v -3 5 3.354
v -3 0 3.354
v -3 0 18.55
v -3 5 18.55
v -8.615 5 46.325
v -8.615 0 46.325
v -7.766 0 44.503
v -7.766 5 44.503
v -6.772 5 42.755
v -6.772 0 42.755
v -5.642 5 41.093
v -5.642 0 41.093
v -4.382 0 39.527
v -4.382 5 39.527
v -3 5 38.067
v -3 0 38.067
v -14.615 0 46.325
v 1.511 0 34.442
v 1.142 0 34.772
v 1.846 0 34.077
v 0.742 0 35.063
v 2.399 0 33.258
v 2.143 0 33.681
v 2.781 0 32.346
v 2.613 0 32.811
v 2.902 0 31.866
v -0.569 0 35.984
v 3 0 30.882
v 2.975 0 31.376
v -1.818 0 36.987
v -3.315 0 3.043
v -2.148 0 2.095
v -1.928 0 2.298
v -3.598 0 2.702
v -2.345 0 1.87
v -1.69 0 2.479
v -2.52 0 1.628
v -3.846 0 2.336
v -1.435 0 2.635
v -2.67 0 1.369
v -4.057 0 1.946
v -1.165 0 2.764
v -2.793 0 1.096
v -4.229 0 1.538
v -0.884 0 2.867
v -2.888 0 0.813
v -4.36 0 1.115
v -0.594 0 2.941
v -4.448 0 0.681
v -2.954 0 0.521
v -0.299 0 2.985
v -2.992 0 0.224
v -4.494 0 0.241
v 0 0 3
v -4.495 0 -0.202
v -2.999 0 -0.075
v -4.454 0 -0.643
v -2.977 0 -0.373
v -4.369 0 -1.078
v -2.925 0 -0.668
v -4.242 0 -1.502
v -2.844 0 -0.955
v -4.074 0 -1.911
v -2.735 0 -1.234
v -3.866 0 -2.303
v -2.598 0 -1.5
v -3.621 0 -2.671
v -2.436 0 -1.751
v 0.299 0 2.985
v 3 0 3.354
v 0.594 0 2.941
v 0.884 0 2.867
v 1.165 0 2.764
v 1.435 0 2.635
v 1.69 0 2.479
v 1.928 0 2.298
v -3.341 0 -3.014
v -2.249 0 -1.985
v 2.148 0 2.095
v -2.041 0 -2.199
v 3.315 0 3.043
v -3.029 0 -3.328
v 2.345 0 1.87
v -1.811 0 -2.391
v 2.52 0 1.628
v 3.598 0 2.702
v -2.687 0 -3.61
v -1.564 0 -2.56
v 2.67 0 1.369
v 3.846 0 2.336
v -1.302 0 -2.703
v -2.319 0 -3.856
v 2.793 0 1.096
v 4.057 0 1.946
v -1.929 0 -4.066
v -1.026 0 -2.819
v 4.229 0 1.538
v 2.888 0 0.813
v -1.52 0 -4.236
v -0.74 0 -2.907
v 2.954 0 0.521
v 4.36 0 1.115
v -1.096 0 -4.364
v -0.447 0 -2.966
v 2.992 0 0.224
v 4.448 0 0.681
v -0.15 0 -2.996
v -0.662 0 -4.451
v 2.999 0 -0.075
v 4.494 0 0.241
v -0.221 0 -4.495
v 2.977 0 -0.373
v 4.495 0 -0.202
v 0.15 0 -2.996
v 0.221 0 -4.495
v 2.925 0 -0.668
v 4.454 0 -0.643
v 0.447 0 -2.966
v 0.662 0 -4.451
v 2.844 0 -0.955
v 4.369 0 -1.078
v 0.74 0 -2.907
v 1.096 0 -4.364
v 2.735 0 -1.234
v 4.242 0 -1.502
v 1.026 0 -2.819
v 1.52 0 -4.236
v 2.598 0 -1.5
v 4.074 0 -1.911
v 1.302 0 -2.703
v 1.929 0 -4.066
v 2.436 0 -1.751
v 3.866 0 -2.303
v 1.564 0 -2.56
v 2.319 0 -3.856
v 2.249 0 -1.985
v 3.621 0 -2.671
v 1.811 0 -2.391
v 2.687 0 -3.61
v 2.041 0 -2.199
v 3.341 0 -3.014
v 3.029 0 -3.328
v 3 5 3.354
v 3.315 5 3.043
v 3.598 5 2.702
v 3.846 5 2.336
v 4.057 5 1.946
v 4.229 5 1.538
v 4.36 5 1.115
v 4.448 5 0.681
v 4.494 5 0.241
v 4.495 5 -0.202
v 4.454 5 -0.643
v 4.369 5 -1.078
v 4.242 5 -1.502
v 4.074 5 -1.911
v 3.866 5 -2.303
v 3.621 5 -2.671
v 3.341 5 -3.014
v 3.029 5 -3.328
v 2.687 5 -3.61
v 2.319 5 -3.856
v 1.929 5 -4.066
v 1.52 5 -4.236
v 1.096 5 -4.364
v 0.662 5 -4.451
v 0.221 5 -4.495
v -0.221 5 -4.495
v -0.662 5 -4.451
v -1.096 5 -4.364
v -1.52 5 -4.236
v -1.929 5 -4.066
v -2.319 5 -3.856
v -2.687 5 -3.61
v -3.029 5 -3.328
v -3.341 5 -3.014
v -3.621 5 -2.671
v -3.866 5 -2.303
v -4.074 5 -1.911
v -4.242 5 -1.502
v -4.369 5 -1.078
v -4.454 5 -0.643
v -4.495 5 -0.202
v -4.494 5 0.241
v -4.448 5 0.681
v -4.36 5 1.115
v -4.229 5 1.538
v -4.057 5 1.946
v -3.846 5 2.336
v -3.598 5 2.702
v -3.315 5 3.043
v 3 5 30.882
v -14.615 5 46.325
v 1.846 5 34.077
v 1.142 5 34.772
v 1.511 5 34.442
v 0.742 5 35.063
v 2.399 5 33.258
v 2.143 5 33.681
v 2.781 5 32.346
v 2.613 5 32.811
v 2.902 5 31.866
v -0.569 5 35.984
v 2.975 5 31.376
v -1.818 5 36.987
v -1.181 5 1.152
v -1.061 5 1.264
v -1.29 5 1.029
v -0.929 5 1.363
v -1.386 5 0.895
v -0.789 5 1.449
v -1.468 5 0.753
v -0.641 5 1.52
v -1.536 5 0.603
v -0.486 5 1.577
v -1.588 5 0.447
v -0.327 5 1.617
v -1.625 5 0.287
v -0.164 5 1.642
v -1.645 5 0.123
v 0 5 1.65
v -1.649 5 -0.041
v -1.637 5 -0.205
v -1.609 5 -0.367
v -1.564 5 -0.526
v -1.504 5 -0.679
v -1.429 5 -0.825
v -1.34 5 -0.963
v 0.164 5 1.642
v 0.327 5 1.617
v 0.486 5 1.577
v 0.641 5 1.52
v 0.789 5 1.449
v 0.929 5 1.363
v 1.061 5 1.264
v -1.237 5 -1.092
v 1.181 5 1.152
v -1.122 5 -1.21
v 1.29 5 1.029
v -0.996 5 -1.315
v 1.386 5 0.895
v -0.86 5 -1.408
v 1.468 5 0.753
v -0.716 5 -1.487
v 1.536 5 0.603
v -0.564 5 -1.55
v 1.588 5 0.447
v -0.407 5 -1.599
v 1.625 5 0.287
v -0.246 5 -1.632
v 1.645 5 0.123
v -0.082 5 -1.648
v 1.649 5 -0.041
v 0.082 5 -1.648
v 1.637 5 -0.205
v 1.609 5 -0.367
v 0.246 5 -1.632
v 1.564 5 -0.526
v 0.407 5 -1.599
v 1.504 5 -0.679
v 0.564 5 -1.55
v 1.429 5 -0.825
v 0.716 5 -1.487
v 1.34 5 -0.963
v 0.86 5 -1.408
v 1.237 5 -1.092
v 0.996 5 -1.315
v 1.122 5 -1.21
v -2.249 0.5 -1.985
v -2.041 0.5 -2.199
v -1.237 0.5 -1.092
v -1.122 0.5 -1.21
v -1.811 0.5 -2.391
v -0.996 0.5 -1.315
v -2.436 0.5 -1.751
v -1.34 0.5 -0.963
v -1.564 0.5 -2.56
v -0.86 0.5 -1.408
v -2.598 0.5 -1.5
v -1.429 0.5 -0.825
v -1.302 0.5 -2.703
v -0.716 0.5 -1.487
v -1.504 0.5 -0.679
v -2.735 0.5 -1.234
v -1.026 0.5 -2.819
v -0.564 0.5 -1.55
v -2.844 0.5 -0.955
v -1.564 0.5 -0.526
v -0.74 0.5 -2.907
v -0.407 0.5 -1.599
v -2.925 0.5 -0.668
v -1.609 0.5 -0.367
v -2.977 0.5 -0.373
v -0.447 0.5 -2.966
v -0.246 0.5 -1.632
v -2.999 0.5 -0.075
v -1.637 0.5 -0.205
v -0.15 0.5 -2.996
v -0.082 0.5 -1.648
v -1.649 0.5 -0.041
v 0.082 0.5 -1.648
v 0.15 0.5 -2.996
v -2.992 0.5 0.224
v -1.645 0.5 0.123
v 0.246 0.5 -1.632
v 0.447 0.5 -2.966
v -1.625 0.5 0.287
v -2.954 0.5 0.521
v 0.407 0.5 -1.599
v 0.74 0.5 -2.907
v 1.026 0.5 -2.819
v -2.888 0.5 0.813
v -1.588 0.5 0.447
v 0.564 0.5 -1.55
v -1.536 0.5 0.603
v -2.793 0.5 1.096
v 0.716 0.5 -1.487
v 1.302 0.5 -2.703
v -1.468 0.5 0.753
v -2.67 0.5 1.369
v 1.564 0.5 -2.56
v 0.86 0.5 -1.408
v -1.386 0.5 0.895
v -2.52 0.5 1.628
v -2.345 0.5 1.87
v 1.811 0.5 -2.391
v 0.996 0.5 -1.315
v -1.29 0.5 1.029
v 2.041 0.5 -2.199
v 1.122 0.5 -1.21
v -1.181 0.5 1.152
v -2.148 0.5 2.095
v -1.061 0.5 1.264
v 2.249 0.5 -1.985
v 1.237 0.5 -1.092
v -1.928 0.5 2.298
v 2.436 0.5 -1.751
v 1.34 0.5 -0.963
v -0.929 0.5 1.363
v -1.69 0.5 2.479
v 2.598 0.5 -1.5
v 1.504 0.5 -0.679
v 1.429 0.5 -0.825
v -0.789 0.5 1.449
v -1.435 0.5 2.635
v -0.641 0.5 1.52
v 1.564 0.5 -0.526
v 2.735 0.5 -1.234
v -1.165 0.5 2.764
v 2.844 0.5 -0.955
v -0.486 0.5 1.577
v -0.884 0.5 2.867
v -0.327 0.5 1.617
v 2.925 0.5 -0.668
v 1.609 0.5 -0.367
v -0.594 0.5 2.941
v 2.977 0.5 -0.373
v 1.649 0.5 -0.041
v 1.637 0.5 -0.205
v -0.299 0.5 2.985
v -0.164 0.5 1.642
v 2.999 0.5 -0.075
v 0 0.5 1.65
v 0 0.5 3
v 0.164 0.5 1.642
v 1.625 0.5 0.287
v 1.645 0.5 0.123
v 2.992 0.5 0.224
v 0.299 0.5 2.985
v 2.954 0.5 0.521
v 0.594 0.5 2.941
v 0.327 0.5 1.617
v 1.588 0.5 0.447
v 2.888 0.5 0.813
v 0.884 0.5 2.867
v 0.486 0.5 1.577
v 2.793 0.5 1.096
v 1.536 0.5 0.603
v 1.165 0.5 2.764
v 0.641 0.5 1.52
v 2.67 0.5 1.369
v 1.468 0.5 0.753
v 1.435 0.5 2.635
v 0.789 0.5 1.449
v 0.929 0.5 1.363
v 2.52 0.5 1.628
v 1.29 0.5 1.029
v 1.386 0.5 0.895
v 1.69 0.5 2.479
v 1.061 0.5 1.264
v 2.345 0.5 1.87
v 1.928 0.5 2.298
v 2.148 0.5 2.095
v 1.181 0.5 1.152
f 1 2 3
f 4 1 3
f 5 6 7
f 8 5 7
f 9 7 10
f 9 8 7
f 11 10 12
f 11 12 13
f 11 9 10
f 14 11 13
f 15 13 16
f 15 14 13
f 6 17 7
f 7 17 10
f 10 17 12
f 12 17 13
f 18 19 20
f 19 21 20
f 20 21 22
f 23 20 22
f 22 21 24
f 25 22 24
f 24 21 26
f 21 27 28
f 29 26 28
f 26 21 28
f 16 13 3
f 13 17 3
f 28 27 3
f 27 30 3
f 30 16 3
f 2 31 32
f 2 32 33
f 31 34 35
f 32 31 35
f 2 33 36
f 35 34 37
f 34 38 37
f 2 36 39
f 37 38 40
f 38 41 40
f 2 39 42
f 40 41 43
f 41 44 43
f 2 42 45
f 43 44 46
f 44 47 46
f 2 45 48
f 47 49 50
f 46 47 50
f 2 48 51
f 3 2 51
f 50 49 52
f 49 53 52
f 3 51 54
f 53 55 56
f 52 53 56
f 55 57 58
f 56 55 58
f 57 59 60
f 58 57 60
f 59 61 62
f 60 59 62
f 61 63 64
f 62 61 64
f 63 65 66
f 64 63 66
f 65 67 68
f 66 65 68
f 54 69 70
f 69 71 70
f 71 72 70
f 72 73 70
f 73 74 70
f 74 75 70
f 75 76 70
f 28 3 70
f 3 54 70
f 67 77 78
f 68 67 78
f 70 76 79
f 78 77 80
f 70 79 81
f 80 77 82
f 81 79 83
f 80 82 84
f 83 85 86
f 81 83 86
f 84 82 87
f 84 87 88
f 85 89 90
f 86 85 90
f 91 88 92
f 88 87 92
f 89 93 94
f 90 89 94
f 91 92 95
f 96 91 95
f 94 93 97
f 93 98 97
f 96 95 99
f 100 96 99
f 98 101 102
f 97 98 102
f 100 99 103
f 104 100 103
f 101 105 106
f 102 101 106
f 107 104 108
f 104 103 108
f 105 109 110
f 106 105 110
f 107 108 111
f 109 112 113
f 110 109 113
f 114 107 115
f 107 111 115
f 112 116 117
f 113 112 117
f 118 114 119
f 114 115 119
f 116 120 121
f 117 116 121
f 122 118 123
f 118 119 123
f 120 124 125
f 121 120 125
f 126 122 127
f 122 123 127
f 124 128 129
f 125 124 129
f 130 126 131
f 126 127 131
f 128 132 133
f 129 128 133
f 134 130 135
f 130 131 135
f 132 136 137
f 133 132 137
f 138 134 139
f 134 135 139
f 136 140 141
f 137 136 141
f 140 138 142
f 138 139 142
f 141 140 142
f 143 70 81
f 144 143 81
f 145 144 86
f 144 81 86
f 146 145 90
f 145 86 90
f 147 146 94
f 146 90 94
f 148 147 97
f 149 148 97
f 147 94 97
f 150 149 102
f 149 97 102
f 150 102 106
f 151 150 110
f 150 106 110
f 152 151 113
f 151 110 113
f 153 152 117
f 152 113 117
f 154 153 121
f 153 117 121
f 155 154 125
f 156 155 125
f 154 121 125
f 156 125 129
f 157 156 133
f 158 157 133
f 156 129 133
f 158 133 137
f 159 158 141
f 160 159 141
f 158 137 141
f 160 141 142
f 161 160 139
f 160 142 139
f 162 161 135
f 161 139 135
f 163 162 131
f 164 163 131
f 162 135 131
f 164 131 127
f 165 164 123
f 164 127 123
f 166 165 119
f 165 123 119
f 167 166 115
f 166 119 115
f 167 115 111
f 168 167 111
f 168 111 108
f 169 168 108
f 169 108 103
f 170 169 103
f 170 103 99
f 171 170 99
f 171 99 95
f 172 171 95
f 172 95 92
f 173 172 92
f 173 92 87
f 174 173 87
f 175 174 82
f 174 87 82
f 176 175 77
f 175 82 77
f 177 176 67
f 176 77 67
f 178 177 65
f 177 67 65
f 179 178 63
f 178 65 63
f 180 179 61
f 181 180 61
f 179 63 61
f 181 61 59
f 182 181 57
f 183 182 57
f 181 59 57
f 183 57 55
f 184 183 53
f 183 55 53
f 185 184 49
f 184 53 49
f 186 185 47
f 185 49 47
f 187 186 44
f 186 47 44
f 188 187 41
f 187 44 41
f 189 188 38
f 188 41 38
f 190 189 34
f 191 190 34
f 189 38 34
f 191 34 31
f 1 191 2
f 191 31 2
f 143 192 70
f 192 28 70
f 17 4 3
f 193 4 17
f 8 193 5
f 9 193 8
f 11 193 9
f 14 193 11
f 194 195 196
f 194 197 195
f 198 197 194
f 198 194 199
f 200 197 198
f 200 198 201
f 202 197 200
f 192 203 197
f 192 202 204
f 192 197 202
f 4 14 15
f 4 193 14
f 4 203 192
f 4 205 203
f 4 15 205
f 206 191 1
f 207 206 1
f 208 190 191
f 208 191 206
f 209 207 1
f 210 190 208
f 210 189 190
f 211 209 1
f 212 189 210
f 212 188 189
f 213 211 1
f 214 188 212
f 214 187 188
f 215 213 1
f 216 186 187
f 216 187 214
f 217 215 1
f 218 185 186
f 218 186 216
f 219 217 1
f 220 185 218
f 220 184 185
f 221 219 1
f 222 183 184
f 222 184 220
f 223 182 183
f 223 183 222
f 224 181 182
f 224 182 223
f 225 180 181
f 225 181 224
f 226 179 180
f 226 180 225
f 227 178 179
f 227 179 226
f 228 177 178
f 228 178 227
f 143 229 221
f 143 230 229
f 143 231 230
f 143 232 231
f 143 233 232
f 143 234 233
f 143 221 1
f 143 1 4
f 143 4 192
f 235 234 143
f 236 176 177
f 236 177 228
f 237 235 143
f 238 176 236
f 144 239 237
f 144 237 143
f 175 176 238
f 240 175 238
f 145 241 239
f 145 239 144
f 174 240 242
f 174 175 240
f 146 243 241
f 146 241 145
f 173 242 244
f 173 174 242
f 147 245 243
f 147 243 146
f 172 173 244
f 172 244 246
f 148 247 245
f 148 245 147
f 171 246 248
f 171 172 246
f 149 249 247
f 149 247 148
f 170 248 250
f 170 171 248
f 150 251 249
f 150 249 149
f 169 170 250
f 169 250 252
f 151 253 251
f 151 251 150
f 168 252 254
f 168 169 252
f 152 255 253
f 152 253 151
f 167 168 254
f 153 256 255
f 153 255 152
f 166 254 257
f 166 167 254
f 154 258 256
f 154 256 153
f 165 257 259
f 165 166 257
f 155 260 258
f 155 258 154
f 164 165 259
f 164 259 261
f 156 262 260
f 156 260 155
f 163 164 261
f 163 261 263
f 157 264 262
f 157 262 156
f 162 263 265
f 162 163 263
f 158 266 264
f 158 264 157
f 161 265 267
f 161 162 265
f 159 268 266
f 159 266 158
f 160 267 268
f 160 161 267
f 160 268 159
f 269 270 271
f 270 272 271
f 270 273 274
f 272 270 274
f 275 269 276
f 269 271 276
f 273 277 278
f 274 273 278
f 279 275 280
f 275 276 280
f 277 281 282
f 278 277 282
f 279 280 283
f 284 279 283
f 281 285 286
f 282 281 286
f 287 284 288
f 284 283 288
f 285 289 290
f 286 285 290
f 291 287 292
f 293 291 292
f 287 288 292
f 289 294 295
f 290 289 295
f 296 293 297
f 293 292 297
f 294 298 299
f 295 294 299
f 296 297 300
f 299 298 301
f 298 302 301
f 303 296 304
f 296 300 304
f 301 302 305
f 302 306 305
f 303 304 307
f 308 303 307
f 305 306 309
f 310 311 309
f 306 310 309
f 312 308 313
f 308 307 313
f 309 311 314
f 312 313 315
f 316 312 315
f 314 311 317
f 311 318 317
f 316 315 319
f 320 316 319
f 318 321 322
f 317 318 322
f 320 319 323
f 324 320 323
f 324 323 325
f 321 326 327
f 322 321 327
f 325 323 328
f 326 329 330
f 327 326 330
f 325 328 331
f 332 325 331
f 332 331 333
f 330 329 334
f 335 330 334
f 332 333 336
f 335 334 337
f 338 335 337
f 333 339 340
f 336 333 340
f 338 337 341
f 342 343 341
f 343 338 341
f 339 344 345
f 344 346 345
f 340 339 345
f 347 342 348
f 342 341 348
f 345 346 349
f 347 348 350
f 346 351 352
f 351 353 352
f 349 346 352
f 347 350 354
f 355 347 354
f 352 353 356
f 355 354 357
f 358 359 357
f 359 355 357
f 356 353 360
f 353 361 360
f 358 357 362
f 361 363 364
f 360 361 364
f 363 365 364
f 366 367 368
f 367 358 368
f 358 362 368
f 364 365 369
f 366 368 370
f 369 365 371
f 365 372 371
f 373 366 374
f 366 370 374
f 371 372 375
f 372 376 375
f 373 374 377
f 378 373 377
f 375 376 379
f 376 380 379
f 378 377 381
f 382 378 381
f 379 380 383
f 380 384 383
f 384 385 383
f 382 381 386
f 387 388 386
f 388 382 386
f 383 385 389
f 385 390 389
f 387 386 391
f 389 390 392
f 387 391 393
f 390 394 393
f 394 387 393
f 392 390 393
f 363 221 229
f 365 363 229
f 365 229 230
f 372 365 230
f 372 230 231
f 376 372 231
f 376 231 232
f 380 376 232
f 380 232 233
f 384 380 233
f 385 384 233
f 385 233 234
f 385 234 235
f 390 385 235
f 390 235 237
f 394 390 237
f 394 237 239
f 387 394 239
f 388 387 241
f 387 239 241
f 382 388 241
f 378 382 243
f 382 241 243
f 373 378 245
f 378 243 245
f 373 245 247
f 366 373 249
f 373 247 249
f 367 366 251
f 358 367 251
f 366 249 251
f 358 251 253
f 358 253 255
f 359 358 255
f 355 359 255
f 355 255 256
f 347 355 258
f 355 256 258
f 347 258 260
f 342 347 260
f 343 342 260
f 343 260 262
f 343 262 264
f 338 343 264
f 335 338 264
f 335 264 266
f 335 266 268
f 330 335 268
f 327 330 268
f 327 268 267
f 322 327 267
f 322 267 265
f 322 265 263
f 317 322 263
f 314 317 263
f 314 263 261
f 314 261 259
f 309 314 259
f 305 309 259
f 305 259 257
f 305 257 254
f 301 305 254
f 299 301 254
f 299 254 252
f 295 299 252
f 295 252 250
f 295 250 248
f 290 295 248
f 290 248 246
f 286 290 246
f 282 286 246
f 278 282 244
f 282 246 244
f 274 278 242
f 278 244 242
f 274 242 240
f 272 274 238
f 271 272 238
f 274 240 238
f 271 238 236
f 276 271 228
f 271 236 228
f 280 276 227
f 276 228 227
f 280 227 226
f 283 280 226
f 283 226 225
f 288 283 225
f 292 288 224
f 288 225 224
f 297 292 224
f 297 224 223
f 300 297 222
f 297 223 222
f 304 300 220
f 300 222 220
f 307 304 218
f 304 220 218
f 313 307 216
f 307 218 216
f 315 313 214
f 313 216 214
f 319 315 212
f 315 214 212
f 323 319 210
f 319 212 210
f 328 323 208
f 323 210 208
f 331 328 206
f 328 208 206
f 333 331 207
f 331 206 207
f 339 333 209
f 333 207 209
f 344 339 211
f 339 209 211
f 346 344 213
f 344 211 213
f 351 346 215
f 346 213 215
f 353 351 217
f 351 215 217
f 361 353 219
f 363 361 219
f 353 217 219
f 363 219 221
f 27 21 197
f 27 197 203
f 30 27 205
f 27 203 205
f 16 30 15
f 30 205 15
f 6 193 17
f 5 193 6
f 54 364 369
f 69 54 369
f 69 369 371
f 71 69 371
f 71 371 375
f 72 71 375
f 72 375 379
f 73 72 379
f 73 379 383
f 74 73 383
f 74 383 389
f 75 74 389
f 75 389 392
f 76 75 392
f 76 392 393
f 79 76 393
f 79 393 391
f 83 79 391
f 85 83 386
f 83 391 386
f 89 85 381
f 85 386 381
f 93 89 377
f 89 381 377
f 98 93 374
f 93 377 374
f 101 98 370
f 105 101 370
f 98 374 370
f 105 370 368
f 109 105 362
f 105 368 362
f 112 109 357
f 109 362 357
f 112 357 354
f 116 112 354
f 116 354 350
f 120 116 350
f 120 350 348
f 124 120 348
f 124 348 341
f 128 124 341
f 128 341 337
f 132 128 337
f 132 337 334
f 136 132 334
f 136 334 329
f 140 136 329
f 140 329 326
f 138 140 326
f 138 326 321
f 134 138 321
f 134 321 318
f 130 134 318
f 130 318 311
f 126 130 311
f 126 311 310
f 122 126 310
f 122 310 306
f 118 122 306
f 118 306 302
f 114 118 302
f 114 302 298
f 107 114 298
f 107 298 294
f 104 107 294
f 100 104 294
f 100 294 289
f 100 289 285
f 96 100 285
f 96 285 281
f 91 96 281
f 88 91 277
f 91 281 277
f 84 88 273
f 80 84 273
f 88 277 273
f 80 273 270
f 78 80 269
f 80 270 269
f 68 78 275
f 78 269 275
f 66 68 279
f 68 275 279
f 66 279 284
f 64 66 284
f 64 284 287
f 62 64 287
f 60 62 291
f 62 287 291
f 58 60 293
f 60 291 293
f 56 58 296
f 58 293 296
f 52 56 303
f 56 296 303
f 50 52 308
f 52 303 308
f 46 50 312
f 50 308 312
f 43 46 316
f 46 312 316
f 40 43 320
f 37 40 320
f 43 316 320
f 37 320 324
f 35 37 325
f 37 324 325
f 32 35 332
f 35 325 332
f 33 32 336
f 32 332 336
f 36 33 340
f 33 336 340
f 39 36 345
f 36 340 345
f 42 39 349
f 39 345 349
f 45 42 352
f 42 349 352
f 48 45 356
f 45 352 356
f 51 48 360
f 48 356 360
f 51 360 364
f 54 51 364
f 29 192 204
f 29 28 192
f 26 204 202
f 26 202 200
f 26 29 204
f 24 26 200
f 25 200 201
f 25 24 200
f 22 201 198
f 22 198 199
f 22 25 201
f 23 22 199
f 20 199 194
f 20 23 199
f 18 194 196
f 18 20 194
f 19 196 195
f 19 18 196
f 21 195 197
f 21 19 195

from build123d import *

# Parameters (mm, degrees)
EXTRUDE_2_DEPTH     = 5
SKETCH_4_R          = 1.65
CUT_EXTRUDE_1_DEPTH = 5
EXTRUDE_3_DEPTH     = 5
CUT_EXTRUDE_START   = -4.5
SKETCH_7_R          = 3
CUT_EXTRUDE_2_DEPTH = 3
CUT_EXTRUDE_3_DEPTH = 7.5
EXTRUDE_4_DEPTH     = 5
FILLET_1_R          = 5
FILLET_2_R          = 5
CUT_EXTRUDE_4_DEPTH = 5


with BuildPart() as part:
    # 草图3 → 凸台-拉伸2 (new body)
    with BuildSketch(Plane(origin=(0, 0, 0), x_dir=(1, 0, 0), z_dir=(0, 1, 0))):
        with BuildLine():
            Line((-3, -3.354101966), (-3, -7.416198487))
            Line((-3, -7.416198487), (-3, -43.854101966))
            Line((-3, -43.854101966), (3, -43.854101966))
            Line((3, -43.854101966), (3, -10.583005244))
            Line((3, -10.583005244), (3, -7.416198487))
            Line((3, -7.416198487), (3, -3.354101966))
            ThreePointArc((3, -3.354101966), (0, 4.5), (-3, -3.354101966))
        make_face()
    extrude(amount=EXTRUDE_2_DEPTH)

    # 草图4 → 切除-拉伸1 (cut)
    with BuildSketch(Plane(origin=(0, 5, 0), x_dir=(1, 0, 0), z_dir=(0, 1, 0))):
        with Locations(Location((0, 0, 0), (0, 0, 270))):
            Circle(SKETCH_4_R)
    extrude(amount=-CUT_EXTRUDE_1_DEPTH, mode=Mode.SUBTRACT)

    # 草图6 → 凸台-拉伸3 (add)
    with BuildSketch(Plane(origin=(0, 5, 0), x_dir=(1, 0, 0), z_dir=(0, 1, 0))):
        with BuildLine():
            Line((3, -33.74604712), (-3, -33.74604712))
            ThreePointArc((-3, -33.74604712), (-16.46902092, -57.986607816), (0.722500961, -79.745993902))
            Line((0.722500961, -79.745993902), (1.949520222, -77.620734201))
            ThreePointArc((1.949520222, -77.620734201), (-10.543317179, -55.371702353), (3, -33.74604712))
        make_face()
    extrude(amount=-EXTRUDE_3_DEPTH)

    # 草图7 → 切除-拉伸2 (cut)
    with BuildSketch(Plane(origin=(0, 5, 0), x_dir=(1, 0, 0), z_dir=(0, 1, 0)).offset(CUT_EXTRUDE_START)):
        with Locations(Location((0, 0, 0), (0, 0, 270))):
            Circle(SKETCH_7_R)
    extrude(amount=-CUT_EXTRUDE_2_DEPTH, mode=Mode.SUBTRACT)

    # 草图8 → 切除-拉伸3 (cut)
    with BuildSketch(Plane(origin=(0, 5, 0), x_dir=(1, 0, 0), z_dir=(0, 1, 0))):
        with BuildLine():
            Line((-3, -38.067187498), (-3, -43.854101966))
            Line((-3, -43.854101966), (3, -43.854101966))
            Line((3, -43.854101966), (3, -33.74604712))
            ThreePointArc((3, -33.74604712), (-0.160637142, -35.683569047), (-3, -38.067187498))
        make_face()
    extrude(amount=-CUT_EXTRUDE_3_DEPTH, mode=Mode.SUBTRACT)

    # 草图9 → 凸台-拉伸4 (add)
    with BuildSketch(Plane(origin=(0, 5, 0), x_dir=(1, 0, 0), z_dir=(0, 1, 0))):
        with BuildLine():
            Line((-3, -18.550074543), (-14.614967684, -46.324924269))
            ThreePointArc((-14.614967684, -46.324924269), (-9.917875534, -39.010182445), (-3, -33.74604712))
            Line((-3, -33.74604712), (-3, -18.550074543))
        make_face()
    extrude(amount=-EXTRUDE_4_DEPTH)

    # 圆角1
    fillet_1_edges = [part.edges().sort_by_distance(p)[0] for p in [
        (3, 2.5, 33.74604712),
    ]]
    fillet(fillet_1_edges, radius=FILLET_1_R)

    # 圆角2
    # the kernel refuses this fillet: 5 mm, written as the material it takes off along each edge
    with BuildSketch(Plane(origin=(1.949520222, 14.371610933, 77.620734201), x_dir=(-0.8261015944022844, 0, -0.5635212114250925), z_dir=(0, -1, 0))) as fillet_2_piece_1:
        with BuildLine():
            CenterArc((4.123508811, -4.985927863), FILLET_2_R, 94.299664485, 55.185648669)
            Line((-0.183986354, -2.447131808), (-0.270136257, -2.396355887))
            ThreePointArc((-0.270136257, -2.396355887), (-0.191711734, -1.216068615), (-0.099718557, 0.007497289))
            Line((-0.099718557, 0.007497289), (0.007497289, 0.099718557))
            ThreePointArc((0.007497289, 0.099718557), (1.874322187, 0.029639314), (3.741147084, 0.099718557))
            Line((3.741147084, 0.099718557), (3.748644373, 0))
        make_face()
    extrude(amount=23.743221866, mode=Mode.SUBTRACT)

    # 草图10 → 切除-拉伸4 (cut)
    with BuildSketch(Plane(origin=(0, 5, 0), x_dir=(1, 0, 0), z_dir=(0, 1, 0))):
        with BuildLine():
            Line((-14.614967684, -46.324924269), (-8.614967684, -46.324924269))
            ThreePointArc((-8.614967684, -46.324924269), (-9.770106213, -62.167654699), (-1.147240872, -75.508293582))
            ThreePointArc((-1.147240872, -75.508293582), (0.307928877, -77.397579493), (0.722500961, -79.745993902))
            ThreePointArc((0.722500961, -79.745993902), (-14.272081884, -66.397409294), (-14.614967684, -46.324924269))
        make_face()
    extrude(amount=-CUT_EXTRUDE_4_DEPTH, mode=Mode.SUBTRACT)


solid = part.part
